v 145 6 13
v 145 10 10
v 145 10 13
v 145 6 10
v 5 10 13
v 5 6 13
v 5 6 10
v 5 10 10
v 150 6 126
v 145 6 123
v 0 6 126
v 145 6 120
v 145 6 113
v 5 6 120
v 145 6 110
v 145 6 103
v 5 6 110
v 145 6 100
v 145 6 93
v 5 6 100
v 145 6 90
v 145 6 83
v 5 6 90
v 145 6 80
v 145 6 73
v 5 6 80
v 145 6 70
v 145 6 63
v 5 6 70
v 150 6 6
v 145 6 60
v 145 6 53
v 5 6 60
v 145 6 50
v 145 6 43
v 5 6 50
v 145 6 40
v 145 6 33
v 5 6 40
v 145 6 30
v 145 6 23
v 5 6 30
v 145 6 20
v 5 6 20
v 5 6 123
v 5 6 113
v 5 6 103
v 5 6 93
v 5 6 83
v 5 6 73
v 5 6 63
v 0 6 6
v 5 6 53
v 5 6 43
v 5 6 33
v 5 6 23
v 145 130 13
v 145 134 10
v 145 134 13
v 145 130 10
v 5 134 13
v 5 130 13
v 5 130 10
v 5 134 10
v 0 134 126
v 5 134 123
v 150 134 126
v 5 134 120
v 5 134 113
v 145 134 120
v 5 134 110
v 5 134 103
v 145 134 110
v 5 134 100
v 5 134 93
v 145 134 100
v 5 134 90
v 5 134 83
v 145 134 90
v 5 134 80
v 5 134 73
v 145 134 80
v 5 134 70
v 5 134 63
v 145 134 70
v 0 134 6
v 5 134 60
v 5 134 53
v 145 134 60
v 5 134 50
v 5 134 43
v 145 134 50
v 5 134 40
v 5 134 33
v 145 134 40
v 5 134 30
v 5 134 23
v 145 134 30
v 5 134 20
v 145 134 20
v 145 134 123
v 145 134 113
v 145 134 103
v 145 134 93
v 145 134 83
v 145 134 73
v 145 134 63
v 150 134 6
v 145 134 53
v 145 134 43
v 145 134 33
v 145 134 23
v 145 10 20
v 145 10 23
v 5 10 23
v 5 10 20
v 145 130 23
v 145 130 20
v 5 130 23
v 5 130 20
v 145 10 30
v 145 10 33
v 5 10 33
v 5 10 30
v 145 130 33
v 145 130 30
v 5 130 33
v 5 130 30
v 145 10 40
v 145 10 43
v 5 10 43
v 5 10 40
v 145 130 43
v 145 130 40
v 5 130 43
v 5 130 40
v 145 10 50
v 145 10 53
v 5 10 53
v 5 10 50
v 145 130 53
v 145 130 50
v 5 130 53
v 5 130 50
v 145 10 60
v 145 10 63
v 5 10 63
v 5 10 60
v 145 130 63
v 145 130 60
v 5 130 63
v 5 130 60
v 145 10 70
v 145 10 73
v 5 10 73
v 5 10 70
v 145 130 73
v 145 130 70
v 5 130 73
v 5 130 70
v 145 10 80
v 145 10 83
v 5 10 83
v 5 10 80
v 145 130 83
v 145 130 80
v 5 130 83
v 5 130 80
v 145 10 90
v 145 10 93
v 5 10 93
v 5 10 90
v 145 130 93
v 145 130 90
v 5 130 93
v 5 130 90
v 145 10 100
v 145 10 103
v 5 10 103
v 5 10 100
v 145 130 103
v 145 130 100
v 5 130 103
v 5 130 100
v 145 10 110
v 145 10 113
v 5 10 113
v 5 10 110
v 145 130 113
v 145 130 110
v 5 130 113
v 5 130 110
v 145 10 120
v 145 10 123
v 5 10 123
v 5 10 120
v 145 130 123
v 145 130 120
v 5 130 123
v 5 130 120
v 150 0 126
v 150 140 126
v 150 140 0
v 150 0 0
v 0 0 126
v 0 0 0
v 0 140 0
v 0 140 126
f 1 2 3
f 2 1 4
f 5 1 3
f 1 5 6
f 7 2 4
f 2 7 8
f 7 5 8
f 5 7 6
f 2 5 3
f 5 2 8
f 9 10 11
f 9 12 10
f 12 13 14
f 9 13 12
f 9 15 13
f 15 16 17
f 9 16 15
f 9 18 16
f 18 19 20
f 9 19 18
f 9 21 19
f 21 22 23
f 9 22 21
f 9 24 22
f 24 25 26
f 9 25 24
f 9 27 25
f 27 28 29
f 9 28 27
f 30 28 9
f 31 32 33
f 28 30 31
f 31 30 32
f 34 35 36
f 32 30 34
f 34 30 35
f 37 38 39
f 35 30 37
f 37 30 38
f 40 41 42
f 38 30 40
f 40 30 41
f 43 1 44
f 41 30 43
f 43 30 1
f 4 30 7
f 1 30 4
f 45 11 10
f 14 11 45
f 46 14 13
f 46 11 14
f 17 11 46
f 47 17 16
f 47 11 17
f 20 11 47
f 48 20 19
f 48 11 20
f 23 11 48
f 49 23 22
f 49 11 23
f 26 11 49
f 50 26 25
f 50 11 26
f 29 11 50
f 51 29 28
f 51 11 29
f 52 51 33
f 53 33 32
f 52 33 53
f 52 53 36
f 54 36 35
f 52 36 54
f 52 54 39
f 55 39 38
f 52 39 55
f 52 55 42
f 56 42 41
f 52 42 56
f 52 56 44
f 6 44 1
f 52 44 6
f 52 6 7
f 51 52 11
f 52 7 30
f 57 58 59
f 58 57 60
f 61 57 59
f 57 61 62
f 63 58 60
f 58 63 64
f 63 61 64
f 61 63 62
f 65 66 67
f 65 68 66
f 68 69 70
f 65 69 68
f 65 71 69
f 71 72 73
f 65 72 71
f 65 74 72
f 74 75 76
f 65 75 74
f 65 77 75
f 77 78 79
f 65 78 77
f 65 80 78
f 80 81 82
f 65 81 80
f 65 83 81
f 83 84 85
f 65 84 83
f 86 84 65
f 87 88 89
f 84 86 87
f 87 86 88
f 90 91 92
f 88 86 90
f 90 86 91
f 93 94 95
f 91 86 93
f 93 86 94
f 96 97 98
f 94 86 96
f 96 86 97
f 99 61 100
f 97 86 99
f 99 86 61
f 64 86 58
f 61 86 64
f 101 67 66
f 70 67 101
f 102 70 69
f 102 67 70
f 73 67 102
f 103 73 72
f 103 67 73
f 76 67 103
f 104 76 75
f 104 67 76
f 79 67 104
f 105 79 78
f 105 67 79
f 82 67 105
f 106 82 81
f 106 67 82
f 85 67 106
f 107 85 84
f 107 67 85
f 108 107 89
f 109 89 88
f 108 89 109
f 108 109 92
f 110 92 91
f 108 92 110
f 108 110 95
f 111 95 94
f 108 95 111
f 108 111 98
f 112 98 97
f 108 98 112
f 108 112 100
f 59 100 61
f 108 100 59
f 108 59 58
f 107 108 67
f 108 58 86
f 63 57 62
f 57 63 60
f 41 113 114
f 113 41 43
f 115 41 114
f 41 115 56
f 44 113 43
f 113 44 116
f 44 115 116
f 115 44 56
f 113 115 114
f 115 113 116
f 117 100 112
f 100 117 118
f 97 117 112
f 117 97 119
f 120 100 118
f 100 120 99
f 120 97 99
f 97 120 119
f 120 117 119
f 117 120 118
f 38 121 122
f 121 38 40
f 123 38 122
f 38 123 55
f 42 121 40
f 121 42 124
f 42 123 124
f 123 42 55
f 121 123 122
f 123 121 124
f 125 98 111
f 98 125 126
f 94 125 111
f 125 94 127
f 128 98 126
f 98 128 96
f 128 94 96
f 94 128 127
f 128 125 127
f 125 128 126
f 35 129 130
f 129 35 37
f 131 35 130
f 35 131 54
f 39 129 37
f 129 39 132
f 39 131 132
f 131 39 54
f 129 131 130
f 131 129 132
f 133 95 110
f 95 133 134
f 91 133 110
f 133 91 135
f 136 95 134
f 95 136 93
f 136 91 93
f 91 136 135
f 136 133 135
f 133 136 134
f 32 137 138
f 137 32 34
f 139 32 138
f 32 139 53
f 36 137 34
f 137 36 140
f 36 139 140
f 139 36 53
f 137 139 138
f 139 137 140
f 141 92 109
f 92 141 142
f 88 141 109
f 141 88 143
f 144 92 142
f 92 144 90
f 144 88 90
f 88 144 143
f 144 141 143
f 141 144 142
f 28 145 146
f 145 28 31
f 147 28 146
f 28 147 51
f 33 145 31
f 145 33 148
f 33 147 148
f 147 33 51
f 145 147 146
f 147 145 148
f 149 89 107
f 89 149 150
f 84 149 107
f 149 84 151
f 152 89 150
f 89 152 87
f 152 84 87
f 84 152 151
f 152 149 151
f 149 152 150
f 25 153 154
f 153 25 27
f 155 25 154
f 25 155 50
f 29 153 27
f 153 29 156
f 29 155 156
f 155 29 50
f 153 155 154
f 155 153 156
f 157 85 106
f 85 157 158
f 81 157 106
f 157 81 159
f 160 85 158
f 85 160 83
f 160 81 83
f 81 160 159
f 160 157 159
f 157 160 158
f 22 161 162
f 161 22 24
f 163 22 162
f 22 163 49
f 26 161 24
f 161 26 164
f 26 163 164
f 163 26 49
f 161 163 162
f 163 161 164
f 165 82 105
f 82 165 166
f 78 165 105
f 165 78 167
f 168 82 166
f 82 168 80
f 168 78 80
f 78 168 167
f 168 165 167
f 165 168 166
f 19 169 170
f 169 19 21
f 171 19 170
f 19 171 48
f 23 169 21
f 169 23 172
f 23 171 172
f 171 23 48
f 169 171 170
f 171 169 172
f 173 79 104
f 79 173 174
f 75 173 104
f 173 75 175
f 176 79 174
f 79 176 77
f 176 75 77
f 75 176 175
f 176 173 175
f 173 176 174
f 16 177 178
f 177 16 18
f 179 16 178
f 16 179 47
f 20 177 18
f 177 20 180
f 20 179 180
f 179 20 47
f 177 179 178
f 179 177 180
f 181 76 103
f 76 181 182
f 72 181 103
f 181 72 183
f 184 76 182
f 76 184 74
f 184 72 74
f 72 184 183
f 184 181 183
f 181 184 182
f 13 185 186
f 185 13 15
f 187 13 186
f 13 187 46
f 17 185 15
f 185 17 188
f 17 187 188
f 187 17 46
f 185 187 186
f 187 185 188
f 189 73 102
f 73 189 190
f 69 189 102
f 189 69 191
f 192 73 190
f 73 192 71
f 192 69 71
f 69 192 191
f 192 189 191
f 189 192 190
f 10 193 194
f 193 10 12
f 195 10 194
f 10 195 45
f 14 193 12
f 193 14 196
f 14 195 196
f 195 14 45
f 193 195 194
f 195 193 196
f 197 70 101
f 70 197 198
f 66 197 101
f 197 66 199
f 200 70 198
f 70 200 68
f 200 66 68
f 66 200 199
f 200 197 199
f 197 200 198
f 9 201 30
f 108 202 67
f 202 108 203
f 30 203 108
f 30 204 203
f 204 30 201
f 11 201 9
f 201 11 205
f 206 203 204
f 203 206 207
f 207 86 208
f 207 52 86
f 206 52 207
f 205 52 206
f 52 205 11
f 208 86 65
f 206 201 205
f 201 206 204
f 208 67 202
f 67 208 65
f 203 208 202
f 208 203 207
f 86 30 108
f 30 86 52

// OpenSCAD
$fn=64;
module wafer_cassette() {
  union() {
    cube([150,6,126]); translate([0,134,0]) cube([150,6,126]);
    cube([150,140,6]);
    for(i=[0:11]) {
      translate([5,6,10+i*10]) cube([140,4,3]);
      translate([5,130,10+i*10]) cube([140,4,3]);
    }
  }
}
wafer_cassette();
